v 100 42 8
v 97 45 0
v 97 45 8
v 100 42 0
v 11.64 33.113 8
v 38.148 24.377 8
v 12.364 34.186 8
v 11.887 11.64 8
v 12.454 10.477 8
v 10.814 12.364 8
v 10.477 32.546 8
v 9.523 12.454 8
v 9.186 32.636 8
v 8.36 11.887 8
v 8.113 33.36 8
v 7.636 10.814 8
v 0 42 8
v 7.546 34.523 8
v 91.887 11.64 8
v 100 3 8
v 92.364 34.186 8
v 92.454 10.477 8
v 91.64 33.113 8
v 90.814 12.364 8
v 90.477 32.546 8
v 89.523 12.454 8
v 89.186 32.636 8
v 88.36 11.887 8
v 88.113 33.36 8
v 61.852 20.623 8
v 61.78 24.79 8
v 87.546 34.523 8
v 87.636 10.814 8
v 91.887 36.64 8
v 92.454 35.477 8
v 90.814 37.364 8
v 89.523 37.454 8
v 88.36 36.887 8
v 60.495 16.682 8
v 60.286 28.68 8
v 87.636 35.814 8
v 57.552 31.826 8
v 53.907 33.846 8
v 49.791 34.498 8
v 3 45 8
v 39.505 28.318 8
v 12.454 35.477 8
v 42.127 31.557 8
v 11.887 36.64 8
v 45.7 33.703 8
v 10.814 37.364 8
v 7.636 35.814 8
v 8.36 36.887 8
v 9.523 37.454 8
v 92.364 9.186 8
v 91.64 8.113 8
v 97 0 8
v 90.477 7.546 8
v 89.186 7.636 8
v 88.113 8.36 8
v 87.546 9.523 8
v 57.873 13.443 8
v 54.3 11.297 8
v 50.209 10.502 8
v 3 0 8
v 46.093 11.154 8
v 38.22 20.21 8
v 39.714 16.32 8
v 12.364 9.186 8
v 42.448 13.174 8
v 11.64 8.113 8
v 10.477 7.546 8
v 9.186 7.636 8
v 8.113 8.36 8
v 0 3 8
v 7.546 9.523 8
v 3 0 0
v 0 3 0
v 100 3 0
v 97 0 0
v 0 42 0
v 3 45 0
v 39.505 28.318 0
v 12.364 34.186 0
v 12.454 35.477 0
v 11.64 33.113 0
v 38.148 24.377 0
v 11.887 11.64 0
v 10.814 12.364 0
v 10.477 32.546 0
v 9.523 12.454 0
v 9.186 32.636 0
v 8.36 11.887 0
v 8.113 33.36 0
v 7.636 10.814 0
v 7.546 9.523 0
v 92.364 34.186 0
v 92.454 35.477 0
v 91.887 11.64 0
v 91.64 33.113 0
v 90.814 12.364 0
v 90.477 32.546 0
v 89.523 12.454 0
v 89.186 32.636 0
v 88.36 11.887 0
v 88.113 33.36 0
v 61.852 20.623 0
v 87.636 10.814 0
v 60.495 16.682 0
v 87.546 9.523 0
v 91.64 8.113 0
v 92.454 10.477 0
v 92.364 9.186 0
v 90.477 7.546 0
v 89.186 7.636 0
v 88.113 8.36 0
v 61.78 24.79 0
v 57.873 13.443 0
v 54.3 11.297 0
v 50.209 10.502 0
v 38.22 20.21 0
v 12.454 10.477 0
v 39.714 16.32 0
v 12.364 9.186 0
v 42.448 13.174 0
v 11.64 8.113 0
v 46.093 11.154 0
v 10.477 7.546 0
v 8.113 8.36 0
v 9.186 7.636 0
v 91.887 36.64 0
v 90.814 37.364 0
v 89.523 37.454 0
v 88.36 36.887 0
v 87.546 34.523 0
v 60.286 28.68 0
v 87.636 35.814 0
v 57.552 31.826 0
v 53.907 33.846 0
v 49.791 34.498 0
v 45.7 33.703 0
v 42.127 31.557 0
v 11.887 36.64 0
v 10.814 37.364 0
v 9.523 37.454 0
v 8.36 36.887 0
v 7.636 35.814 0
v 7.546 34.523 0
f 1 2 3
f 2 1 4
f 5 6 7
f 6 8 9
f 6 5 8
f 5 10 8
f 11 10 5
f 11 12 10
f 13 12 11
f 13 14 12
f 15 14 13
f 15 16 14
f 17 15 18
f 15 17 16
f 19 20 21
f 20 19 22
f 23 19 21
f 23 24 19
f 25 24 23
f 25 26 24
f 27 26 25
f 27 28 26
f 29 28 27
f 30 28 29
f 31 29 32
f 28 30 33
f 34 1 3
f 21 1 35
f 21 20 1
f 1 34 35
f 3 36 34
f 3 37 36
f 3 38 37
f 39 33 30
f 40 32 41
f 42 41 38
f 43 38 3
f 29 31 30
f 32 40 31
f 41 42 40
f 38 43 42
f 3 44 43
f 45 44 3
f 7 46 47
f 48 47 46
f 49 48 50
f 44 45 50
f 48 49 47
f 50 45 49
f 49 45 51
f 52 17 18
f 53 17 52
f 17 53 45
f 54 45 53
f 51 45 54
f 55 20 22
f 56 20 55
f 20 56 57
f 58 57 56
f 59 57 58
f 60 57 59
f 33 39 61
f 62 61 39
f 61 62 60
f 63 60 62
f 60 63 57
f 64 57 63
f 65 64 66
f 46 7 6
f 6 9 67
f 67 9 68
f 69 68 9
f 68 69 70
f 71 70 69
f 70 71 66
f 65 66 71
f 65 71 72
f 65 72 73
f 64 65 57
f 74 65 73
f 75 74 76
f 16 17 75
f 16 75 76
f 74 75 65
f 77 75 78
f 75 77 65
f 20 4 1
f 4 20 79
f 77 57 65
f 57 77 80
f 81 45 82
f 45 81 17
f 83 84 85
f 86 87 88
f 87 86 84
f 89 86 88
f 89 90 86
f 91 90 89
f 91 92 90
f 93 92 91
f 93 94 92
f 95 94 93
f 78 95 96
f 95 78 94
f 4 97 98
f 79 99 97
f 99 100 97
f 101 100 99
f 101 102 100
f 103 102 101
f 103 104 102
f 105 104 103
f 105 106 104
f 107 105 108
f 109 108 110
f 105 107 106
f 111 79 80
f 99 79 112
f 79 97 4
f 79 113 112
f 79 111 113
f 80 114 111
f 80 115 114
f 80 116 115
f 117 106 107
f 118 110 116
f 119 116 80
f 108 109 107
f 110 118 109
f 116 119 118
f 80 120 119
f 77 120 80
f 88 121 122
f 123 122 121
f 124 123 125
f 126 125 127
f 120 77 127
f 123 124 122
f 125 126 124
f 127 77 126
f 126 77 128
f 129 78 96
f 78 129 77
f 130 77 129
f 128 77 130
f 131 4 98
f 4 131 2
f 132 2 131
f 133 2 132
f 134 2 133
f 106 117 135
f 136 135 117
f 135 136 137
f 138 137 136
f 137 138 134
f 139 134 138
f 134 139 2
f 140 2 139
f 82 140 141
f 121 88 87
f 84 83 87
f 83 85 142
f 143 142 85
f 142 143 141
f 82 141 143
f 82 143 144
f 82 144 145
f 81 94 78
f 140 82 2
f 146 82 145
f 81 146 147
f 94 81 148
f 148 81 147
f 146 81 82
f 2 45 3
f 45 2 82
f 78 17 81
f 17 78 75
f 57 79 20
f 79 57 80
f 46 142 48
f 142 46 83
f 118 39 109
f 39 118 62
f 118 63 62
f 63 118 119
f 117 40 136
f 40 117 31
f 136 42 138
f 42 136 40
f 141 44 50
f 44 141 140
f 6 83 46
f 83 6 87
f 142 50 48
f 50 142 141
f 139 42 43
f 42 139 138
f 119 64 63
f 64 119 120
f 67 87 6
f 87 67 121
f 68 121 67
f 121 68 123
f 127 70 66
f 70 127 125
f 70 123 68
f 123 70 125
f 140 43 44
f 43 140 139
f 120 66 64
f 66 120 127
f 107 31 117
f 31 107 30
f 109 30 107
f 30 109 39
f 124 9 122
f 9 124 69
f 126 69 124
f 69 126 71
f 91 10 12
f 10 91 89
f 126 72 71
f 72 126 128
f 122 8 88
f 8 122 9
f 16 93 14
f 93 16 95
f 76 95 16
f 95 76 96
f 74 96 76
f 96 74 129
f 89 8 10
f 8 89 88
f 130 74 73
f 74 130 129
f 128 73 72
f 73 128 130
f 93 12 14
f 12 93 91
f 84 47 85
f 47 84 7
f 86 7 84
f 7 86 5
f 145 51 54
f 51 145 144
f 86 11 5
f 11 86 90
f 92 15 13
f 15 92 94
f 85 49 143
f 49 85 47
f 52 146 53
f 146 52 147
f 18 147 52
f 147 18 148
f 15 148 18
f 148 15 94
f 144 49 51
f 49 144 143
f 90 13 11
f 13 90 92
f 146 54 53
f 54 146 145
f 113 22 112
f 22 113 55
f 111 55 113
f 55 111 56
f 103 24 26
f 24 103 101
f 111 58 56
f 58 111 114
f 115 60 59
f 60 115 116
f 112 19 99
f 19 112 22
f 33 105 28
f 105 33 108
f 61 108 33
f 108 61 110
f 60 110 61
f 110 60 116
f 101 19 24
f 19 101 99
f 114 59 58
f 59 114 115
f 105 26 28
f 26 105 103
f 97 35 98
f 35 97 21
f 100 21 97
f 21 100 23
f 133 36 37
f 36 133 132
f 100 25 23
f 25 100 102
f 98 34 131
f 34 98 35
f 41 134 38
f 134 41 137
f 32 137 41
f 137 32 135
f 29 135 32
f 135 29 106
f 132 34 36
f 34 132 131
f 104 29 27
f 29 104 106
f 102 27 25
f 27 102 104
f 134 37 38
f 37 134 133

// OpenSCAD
$fn = 32;

// ----------------------------------------------------------------------
// Spacer plate: rect 100 x 45
// ----------------------------------------------------------------------

// --- parameters (mm) ---
bore_r = 12;              // centre bore radius
bolt_r = 2.5;             // bolt hole radius
plate_t = 8;              // plate thickness, Z (extrusion height)
plate_l = 100;            // plate length, X
plate_w = 45;             // plate width, Y
inset = 10;               // corner hole inset

profile = [[3, 0], [97, 0], [100, 3], [100, 42], [97, 45], [3, 45], [0, 42], [0, 3]];  // primary outline, 8 points, counter clockwise
void_1 = [[61.78, 24.79], [60.286, 28.68], [57.552, 31.826], [53.907, 33.846], [49.791, 34.498], [45.7, 33.703], [42.127, 31.557], [39.505, 28.318], [38.148, 24.377], [38.22, 20.21], [39.714, 16.32], [42.448, 13.174], [46.093, 11.154], [50.209, 10.502], [54.3, 11.297], [57.873, 13.443], [60.495, 16.682], [61.852, 20.623]];  // centre bore, 18 points
void_2 = [[12.454, 10.477], [11.887, 11.64], [10.814, 12.364], [9.523, 12.454], [8.36, 11.887], [7.636, 10.814], [7.546, 9.523], [8.113, 8.36], [9.186, 7.636], [10.477, 7.546], [11.64, 8.113], [12.364, 9.186]];  // corner hole, 12 points
void_3 = [[12.454, 35.477], [11.887, 36.64], [10.814, 37.364], [9.523, 37.454], [8.36, 36.887], [7.636, 35.814], [7.546, 34.523], [8.113, 33.36], [9.186, 32.636], [10.477, 32.546], [11.64, 33.113], [12.364, 34.186]];  // corner hole, 12 points
void_4 = [[92.454, 10.477], [91.887, 11.64], [90.814, 12.364], [89.523, 12.454], [88.36, 11.887], [87.636, 10.814], [87.546, 9.523], [88.113, 8.36], [89.186, 7.636], [90.477, 7.546], [91.64, 8.113], [92.364, 9.186]];  // corner hole, 12 points
void_5 = [[92.454, 35.477], [91.887, 36.64], [90.814, 37.364], [89.523, 37.454], [88.36, 36.887], [87.636, 35.814], [87.546, 34.523], [88.113, 33.36], [89.186, 32.636], [90.477, 32.546], [91.64, 33.113], [92.364, 34.186]];  // corner hole, 12 points

// --- the one profile operation ---
difference() {
  linear_extrude(height = plate_t) polygon(points = profile);
  translate([0, 0, -1])
    linear_extrude(height = plate_t + 2) polygon(points = void_1);
  translate([0, 0, -1])
    linear_extrude(height = plate_t + 2) polygon(points = void_2);
  translate([0, 0, -1])
    linear_extrude(height = plate_t + 2) polygon(points = void_3);
  translate([0, 0, -1])
    linear_extrude(height = plate_t + 2) polygon(points = void_4);
  translate([0, 0, -1])
    linear_extrude(height = plate_t + 2) polygon(points = void_5);
}
